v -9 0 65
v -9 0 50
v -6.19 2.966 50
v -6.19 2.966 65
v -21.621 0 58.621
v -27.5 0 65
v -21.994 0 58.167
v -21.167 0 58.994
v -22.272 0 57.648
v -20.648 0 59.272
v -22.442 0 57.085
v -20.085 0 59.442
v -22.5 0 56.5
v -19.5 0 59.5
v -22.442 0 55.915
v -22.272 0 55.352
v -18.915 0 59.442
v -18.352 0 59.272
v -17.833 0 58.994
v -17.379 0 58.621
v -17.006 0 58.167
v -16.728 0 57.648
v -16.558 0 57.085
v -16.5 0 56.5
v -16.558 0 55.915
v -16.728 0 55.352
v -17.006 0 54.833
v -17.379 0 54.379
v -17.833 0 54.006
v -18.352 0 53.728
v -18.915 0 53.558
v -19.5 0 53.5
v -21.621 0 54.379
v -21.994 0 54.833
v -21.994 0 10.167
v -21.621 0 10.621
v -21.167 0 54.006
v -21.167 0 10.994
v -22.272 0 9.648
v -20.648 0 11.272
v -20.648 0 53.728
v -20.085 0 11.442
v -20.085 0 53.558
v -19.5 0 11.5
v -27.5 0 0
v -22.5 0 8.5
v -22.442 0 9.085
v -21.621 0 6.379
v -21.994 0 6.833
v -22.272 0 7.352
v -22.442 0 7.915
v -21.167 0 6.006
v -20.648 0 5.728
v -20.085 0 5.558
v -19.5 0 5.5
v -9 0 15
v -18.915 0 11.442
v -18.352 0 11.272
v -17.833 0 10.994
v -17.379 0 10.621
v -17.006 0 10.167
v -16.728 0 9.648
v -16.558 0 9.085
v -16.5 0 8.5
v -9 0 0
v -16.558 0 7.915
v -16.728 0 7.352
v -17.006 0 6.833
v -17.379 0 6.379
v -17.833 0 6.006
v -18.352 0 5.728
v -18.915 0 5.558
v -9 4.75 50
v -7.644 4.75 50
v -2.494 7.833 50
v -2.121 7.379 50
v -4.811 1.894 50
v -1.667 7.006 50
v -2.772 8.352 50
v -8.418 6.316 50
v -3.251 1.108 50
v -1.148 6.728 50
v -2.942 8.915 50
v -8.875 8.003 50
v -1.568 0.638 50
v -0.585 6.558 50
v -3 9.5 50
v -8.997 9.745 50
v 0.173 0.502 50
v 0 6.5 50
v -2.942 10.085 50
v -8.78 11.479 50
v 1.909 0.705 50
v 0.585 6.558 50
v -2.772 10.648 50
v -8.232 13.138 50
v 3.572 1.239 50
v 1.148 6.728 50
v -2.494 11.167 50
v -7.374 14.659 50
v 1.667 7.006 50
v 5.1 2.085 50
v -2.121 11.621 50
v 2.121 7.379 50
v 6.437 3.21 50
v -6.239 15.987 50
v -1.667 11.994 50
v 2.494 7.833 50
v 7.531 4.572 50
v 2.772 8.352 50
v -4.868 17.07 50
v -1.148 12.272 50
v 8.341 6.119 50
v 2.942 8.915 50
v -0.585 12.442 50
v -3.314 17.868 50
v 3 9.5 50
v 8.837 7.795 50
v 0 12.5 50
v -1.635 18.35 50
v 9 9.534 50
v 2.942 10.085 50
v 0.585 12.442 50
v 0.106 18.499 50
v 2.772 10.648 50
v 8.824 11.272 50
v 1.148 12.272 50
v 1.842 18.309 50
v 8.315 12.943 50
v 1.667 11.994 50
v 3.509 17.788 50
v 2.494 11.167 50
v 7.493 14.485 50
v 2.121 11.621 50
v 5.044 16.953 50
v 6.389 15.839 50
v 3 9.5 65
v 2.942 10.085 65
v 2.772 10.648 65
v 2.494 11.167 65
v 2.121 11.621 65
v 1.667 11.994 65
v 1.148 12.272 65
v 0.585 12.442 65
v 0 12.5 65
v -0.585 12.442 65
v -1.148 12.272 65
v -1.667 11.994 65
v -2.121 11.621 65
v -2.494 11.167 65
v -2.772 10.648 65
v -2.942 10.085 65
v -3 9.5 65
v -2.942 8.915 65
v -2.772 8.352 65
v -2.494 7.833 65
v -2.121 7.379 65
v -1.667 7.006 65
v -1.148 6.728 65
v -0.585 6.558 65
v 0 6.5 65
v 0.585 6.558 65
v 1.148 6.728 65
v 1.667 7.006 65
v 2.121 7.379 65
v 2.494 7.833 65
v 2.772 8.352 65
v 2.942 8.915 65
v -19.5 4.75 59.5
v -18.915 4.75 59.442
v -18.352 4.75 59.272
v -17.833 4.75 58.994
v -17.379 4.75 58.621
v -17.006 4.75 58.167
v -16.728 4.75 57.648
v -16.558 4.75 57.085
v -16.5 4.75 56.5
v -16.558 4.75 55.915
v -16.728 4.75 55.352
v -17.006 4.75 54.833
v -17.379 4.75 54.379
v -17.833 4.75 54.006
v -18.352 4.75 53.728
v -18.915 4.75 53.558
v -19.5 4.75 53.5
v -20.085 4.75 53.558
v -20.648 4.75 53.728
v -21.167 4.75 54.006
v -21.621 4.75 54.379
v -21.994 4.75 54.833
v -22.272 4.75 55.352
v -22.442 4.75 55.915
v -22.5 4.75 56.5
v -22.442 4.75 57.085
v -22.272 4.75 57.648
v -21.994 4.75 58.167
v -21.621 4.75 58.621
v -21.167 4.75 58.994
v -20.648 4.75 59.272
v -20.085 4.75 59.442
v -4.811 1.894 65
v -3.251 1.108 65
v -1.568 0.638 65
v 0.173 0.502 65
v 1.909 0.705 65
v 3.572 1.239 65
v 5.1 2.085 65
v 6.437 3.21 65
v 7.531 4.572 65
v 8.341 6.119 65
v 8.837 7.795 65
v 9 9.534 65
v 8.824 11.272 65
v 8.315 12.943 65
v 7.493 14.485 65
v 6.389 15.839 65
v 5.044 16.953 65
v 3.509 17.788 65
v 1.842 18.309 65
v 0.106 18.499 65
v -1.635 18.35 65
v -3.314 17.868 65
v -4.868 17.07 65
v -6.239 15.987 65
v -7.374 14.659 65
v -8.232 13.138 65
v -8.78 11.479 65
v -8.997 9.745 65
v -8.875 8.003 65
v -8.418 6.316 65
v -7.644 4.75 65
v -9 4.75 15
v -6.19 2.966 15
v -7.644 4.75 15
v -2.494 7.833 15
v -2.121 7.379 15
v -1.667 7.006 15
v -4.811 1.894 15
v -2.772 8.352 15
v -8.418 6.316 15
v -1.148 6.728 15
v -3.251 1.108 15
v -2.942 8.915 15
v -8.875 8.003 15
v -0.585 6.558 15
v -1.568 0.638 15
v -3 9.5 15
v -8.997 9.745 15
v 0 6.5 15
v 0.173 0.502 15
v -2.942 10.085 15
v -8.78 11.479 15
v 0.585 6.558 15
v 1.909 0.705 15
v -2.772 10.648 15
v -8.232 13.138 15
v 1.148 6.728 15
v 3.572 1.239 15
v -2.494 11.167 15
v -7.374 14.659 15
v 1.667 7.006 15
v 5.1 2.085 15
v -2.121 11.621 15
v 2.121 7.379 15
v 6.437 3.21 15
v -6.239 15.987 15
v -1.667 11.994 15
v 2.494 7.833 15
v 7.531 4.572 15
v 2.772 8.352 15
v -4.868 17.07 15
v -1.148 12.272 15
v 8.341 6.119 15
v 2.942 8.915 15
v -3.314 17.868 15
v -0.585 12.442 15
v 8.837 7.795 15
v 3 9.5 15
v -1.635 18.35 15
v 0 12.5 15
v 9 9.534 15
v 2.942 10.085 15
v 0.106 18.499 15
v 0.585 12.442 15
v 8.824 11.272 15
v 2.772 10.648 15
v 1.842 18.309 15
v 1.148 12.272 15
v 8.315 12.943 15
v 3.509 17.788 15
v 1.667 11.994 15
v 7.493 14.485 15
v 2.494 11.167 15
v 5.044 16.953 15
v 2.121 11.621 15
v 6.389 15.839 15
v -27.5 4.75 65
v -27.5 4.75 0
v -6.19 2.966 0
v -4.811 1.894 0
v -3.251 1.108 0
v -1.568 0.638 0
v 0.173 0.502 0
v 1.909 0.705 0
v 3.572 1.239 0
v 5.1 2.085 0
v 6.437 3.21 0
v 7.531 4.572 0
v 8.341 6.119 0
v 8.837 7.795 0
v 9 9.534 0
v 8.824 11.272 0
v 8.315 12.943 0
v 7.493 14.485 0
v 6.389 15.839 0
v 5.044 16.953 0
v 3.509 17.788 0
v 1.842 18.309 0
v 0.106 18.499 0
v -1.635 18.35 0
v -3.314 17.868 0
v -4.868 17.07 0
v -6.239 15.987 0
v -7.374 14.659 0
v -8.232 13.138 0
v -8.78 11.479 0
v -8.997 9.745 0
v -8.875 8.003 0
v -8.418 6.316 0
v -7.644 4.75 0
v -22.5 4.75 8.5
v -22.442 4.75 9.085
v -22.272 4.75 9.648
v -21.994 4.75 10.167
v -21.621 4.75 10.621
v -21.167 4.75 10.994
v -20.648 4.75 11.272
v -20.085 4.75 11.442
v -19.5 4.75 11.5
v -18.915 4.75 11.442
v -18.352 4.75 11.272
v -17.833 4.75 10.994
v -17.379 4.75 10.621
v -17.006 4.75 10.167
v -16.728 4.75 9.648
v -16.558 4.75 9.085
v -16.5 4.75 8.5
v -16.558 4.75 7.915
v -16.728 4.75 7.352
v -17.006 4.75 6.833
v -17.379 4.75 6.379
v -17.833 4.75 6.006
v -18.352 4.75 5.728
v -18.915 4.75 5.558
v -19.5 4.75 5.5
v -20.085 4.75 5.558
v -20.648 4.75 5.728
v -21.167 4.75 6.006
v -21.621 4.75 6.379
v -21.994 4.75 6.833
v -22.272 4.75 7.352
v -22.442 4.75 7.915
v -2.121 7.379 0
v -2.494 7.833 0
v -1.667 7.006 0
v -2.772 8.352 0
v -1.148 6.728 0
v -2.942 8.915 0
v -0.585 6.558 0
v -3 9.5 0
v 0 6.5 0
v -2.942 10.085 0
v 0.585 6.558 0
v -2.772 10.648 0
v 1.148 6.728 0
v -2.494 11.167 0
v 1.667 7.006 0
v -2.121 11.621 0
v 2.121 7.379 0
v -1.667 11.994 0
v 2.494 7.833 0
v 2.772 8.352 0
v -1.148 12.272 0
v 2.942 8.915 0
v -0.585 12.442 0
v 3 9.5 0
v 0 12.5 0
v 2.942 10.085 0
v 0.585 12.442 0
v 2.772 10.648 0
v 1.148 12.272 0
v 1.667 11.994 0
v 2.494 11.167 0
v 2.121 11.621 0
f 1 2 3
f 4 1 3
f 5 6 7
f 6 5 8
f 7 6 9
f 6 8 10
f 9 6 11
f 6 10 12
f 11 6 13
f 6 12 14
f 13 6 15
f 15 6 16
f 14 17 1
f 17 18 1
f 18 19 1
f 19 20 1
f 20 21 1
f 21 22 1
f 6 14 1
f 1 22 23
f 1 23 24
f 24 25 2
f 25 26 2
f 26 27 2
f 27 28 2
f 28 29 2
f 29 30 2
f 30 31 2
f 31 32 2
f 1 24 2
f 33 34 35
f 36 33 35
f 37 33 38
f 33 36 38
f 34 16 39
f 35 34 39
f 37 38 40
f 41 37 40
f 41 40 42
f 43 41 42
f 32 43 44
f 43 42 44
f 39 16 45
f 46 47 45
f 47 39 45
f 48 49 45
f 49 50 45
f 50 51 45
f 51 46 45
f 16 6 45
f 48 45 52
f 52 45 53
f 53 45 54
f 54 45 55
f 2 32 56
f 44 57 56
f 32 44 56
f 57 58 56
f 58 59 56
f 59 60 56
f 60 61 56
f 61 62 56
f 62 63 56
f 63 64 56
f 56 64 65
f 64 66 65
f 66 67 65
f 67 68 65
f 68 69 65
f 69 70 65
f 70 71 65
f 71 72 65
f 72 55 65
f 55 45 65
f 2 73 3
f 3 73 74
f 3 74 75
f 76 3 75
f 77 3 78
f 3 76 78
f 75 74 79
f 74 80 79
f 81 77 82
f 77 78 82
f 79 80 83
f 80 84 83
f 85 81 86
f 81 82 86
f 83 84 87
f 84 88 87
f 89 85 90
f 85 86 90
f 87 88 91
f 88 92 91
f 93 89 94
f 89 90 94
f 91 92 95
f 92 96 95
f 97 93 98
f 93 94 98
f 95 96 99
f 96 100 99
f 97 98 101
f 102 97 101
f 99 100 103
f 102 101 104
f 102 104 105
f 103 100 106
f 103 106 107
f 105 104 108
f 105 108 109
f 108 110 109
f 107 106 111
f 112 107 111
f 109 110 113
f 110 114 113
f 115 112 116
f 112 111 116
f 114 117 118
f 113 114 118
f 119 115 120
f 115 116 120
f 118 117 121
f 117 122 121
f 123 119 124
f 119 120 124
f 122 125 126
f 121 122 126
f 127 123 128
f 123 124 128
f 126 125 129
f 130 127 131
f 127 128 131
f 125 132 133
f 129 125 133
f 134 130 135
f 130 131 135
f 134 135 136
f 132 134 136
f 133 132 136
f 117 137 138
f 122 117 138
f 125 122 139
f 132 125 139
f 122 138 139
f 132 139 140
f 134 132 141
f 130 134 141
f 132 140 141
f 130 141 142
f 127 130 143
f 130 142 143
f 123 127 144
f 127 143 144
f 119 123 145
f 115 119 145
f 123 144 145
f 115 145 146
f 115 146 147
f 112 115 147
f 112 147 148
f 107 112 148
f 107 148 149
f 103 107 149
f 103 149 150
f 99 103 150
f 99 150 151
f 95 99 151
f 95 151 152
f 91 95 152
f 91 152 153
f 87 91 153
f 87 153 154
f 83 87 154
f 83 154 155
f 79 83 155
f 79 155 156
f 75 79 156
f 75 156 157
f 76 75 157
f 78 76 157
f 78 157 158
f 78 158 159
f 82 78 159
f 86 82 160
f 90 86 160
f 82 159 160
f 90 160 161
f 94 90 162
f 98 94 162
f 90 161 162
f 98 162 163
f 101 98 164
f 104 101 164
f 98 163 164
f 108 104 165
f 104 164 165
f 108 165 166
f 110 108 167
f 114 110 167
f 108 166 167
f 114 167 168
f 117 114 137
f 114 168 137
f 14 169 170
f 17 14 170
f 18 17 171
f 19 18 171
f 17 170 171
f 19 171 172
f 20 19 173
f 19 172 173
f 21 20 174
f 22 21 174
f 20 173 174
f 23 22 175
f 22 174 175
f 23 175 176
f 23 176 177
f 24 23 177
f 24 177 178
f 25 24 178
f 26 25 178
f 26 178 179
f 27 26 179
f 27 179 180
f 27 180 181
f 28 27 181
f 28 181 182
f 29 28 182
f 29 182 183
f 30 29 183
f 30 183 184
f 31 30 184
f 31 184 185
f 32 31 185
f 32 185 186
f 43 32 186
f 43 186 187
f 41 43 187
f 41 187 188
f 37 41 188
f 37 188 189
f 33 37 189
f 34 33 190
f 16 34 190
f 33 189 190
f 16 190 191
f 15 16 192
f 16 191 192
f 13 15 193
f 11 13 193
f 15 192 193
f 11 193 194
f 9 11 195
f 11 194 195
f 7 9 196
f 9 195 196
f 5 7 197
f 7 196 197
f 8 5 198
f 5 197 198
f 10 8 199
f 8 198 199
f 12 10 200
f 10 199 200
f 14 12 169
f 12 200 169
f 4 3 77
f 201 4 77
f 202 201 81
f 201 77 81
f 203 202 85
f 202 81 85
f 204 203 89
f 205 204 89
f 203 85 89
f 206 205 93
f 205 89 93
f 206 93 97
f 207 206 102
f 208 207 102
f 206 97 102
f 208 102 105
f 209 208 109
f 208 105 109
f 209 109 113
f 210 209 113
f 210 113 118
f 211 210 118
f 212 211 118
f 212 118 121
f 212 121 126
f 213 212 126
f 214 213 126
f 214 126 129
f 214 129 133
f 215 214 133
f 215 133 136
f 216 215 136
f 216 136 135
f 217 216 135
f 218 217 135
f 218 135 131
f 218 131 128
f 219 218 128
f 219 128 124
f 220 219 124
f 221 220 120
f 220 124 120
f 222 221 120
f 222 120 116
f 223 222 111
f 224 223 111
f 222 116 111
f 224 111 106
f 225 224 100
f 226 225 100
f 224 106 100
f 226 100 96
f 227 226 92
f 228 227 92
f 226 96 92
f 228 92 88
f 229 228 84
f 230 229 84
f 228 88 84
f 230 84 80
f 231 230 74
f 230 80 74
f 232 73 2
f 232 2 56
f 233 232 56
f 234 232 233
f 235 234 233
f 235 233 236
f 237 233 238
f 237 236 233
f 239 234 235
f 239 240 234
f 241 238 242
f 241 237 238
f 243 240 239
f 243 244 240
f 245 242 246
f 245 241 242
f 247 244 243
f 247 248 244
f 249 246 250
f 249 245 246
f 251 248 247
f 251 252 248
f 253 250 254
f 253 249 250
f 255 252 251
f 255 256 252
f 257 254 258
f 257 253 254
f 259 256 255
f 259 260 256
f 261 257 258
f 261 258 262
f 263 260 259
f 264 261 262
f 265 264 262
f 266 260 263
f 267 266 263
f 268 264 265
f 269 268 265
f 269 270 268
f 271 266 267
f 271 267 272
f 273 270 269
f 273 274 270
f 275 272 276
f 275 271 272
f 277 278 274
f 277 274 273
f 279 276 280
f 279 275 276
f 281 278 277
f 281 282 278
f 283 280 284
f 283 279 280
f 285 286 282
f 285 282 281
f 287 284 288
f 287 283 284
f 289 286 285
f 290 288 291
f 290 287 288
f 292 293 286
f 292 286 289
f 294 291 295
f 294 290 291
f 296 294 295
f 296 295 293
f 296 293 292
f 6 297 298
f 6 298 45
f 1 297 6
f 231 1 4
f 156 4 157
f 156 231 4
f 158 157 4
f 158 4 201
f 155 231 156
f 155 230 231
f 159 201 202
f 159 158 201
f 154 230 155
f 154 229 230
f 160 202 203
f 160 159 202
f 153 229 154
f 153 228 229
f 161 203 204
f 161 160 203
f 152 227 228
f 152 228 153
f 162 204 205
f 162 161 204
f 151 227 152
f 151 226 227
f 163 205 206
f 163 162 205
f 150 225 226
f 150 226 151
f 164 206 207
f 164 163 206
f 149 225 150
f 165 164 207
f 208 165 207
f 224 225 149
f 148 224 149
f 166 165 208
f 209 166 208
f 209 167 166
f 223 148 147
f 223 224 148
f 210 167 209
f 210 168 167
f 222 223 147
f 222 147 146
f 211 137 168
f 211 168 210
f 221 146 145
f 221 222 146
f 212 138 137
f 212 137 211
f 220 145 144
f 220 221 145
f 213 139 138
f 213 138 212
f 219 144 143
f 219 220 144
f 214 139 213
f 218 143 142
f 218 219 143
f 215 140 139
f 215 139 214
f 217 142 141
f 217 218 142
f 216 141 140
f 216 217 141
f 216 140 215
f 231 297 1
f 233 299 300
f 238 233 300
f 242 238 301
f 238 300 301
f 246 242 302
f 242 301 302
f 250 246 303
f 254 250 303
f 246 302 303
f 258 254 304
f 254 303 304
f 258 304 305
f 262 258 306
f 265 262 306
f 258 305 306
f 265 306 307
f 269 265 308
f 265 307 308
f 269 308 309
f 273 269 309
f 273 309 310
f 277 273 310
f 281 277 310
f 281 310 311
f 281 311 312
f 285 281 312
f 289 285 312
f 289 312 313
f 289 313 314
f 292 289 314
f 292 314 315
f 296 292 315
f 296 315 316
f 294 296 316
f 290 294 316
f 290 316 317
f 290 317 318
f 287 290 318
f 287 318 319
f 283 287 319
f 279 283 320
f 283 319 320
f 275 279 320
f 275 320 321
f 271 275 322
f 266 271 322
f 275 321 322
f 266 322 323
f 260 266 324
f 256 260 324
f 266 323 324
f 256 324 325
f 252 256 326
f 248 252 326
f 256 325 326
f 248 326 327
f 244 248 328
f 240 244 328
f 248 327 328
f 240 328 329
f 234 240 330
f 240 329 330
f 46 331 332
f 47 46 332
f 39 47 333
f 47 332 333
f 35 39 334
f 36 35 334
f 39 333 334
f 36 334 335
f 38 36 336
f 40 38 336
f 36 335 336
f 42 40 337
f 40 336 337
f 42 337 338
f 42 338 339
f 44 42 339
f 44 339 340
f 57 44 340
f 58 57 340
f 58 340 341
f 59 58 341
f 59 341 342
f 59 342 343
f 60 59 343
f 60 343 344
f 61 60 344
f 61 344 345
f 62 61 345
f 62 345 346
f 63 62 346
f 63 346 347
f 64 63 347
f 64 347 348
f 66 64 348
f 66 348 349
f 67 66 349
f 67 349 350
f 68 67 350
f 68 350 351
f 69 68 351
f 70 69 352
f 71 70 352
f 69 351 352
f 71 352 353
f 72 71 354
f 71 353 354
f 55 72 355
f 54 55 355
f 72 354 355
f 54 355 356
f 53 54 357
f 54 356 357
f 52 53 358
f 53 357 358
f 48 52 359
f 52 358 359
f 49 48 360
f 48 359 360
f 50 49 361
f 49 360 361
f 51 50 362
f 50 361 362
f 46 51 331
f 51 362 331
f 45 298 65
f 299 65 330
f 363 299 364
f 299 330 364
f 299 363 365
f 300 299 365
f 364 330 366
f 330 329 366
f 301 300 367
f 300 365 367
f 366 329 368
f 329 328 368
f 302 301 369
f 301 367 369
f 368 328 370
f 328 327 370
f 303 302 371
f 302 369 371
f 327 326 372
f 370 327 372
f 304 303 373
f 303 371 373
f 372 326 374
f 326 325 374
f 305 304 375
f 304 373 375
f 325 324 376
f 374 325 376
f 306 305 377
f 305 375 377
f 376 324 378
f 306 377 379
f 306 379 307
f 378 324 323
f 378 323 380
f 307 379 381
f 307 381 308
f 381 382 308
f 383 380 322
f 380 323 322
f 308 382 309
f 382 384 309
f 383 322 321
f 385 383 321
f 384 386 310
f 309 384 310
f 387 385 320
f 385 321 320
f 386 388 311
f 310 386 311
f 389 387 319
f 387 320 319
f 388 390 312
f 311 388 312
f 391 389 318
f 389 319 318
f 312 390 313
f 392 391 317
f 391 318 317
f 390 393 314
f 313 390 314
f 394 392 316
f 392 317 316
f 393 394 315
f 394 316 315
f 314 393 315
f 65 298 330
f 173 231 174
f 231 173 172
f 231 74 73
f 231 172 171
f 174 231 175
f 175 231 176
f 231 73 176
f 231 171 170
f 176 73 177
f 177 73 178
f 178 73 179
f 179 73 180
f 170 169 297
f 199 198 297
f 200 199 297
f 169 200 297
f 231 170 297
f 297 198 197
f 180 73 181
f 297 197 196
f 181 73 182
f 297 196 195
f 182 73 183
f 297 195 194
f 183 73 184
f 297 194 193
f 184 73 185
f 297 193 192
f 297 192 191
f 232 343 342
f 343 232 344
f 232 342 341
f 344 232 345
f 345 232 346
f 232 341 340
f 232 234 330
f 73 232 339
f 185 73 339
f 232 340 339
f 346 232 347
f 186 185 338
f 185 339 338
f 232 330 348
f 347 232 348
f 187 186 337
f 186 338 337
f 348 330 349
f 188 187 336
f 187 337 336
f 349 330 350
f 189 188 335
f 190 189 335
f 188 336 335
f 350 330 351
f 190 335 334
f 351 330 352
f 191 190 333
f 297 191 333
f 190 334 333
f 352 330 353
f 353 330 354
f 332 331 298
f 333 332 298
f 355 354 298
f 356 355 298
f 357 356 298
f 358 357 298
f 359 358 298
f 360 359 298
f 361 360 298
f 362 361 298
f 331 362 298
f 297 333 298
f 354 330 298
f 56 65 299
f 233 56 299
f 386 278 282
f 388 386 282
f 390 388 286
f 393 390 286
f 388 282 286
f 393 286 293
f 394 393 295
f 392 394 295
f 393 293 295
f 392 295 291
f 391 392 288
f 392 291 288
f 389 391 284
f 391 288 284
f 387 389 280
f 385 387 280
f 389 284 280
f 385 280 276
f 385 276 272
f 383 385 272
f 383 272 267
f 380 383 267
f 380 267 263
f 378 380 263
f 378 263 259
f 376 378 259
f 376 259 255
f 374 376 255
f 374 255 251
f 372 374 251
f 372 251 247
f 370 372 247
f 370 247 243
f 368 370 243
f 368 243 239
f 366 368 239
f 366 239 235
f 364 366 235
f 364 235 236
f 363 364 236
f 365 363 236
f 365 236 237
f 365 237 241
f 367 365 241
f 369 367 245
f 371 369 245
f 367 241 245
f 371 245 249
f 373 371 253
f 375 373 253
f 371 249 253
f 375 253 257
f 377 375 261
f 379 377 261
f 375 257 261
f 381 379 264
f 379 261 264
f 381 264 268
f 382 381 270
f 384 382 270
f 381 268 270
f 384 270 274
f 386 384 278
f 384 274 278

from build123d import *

# Parameters (mm, degrees)
EXTRUDE_1_DEPTH     = 65
SKETCH_2_R          = 3
CUT_EXTRUDE_1_DEPTH = 65
SKETCH_3_W          = 19.333072345
SKETCH_3_H          = 35
CUT_EXTRUDE_2_DEPTH = 32.5
SKETCH_4_R          = 3
CUT_EXTRUDE_3_DEPTH = 65


with BuildPart() as part:
    # 草图1 → 凸台-拉伸1 (new body)
    with BuildSketch(Plane.XY):
        with BuildLine():
            Line((-27.5, 4.75), (-27.5, 0))
            Line((-27.5, 0), (-9, 0))
            Line((-9, 0), (-6.189701831, 2.966425845))
            ThreePointArc((-6.189701831, 2.966425845), (6.974322263, 15.188482133), (-7.644442426, 4.75))
            Line((-7.644442426, 4.75), (-27.5, 4.75))
        make_face()
    extrude(amount=EXTRUDE_1_DEPTH)

    # 草图2 → 切除-拉伸1 (cut)
    with BuildSketch(Plane(origin=(0, 4.75, 0), x_dir=(1, 0, 0), z_dir=(0, 1, 0))):
        with Locations(Location((-19.5, -8.5, 0), (0, 0, 180))):
            Circle(SKETCH_2_R)
        with Locations(Location((-19.5, -56.5, 0), (0, 0, 270))):
            Circle(SKETCH_2_R)
    extrude(amount=-CUT_EXTRUDE_1_DEPTH, mode=Mode.SUBTRACT)

    # 草图3 → 切除-拉伸2 (cut, symmetric)
    with BuildSketch(Plane(origin=(0, 4.75, 0), x_dir=(1, 0, 0), z_dir=(0, 1, 0))):
        with Locations((0.666536173, -32.5)):
            Rectangle(SKETCH_3_W, SKETCH_3_H)
    extrude(amount=CUT_EXTRUDE_2_DEPTH, both=True, mode=Mode.SUBTRACT)

    # 草图4 → 切除-拉伸3 (cut)
    with BuildSketch(Plane.XY.offset(65)):
        with Locations((0, 9.5)):
            Circle(SKETCH_4_R)
    extrude(amount=-CUT_EXTRUDE_3_DEPTH, mode=Mode.SUBTRACT)


solid = part.part
